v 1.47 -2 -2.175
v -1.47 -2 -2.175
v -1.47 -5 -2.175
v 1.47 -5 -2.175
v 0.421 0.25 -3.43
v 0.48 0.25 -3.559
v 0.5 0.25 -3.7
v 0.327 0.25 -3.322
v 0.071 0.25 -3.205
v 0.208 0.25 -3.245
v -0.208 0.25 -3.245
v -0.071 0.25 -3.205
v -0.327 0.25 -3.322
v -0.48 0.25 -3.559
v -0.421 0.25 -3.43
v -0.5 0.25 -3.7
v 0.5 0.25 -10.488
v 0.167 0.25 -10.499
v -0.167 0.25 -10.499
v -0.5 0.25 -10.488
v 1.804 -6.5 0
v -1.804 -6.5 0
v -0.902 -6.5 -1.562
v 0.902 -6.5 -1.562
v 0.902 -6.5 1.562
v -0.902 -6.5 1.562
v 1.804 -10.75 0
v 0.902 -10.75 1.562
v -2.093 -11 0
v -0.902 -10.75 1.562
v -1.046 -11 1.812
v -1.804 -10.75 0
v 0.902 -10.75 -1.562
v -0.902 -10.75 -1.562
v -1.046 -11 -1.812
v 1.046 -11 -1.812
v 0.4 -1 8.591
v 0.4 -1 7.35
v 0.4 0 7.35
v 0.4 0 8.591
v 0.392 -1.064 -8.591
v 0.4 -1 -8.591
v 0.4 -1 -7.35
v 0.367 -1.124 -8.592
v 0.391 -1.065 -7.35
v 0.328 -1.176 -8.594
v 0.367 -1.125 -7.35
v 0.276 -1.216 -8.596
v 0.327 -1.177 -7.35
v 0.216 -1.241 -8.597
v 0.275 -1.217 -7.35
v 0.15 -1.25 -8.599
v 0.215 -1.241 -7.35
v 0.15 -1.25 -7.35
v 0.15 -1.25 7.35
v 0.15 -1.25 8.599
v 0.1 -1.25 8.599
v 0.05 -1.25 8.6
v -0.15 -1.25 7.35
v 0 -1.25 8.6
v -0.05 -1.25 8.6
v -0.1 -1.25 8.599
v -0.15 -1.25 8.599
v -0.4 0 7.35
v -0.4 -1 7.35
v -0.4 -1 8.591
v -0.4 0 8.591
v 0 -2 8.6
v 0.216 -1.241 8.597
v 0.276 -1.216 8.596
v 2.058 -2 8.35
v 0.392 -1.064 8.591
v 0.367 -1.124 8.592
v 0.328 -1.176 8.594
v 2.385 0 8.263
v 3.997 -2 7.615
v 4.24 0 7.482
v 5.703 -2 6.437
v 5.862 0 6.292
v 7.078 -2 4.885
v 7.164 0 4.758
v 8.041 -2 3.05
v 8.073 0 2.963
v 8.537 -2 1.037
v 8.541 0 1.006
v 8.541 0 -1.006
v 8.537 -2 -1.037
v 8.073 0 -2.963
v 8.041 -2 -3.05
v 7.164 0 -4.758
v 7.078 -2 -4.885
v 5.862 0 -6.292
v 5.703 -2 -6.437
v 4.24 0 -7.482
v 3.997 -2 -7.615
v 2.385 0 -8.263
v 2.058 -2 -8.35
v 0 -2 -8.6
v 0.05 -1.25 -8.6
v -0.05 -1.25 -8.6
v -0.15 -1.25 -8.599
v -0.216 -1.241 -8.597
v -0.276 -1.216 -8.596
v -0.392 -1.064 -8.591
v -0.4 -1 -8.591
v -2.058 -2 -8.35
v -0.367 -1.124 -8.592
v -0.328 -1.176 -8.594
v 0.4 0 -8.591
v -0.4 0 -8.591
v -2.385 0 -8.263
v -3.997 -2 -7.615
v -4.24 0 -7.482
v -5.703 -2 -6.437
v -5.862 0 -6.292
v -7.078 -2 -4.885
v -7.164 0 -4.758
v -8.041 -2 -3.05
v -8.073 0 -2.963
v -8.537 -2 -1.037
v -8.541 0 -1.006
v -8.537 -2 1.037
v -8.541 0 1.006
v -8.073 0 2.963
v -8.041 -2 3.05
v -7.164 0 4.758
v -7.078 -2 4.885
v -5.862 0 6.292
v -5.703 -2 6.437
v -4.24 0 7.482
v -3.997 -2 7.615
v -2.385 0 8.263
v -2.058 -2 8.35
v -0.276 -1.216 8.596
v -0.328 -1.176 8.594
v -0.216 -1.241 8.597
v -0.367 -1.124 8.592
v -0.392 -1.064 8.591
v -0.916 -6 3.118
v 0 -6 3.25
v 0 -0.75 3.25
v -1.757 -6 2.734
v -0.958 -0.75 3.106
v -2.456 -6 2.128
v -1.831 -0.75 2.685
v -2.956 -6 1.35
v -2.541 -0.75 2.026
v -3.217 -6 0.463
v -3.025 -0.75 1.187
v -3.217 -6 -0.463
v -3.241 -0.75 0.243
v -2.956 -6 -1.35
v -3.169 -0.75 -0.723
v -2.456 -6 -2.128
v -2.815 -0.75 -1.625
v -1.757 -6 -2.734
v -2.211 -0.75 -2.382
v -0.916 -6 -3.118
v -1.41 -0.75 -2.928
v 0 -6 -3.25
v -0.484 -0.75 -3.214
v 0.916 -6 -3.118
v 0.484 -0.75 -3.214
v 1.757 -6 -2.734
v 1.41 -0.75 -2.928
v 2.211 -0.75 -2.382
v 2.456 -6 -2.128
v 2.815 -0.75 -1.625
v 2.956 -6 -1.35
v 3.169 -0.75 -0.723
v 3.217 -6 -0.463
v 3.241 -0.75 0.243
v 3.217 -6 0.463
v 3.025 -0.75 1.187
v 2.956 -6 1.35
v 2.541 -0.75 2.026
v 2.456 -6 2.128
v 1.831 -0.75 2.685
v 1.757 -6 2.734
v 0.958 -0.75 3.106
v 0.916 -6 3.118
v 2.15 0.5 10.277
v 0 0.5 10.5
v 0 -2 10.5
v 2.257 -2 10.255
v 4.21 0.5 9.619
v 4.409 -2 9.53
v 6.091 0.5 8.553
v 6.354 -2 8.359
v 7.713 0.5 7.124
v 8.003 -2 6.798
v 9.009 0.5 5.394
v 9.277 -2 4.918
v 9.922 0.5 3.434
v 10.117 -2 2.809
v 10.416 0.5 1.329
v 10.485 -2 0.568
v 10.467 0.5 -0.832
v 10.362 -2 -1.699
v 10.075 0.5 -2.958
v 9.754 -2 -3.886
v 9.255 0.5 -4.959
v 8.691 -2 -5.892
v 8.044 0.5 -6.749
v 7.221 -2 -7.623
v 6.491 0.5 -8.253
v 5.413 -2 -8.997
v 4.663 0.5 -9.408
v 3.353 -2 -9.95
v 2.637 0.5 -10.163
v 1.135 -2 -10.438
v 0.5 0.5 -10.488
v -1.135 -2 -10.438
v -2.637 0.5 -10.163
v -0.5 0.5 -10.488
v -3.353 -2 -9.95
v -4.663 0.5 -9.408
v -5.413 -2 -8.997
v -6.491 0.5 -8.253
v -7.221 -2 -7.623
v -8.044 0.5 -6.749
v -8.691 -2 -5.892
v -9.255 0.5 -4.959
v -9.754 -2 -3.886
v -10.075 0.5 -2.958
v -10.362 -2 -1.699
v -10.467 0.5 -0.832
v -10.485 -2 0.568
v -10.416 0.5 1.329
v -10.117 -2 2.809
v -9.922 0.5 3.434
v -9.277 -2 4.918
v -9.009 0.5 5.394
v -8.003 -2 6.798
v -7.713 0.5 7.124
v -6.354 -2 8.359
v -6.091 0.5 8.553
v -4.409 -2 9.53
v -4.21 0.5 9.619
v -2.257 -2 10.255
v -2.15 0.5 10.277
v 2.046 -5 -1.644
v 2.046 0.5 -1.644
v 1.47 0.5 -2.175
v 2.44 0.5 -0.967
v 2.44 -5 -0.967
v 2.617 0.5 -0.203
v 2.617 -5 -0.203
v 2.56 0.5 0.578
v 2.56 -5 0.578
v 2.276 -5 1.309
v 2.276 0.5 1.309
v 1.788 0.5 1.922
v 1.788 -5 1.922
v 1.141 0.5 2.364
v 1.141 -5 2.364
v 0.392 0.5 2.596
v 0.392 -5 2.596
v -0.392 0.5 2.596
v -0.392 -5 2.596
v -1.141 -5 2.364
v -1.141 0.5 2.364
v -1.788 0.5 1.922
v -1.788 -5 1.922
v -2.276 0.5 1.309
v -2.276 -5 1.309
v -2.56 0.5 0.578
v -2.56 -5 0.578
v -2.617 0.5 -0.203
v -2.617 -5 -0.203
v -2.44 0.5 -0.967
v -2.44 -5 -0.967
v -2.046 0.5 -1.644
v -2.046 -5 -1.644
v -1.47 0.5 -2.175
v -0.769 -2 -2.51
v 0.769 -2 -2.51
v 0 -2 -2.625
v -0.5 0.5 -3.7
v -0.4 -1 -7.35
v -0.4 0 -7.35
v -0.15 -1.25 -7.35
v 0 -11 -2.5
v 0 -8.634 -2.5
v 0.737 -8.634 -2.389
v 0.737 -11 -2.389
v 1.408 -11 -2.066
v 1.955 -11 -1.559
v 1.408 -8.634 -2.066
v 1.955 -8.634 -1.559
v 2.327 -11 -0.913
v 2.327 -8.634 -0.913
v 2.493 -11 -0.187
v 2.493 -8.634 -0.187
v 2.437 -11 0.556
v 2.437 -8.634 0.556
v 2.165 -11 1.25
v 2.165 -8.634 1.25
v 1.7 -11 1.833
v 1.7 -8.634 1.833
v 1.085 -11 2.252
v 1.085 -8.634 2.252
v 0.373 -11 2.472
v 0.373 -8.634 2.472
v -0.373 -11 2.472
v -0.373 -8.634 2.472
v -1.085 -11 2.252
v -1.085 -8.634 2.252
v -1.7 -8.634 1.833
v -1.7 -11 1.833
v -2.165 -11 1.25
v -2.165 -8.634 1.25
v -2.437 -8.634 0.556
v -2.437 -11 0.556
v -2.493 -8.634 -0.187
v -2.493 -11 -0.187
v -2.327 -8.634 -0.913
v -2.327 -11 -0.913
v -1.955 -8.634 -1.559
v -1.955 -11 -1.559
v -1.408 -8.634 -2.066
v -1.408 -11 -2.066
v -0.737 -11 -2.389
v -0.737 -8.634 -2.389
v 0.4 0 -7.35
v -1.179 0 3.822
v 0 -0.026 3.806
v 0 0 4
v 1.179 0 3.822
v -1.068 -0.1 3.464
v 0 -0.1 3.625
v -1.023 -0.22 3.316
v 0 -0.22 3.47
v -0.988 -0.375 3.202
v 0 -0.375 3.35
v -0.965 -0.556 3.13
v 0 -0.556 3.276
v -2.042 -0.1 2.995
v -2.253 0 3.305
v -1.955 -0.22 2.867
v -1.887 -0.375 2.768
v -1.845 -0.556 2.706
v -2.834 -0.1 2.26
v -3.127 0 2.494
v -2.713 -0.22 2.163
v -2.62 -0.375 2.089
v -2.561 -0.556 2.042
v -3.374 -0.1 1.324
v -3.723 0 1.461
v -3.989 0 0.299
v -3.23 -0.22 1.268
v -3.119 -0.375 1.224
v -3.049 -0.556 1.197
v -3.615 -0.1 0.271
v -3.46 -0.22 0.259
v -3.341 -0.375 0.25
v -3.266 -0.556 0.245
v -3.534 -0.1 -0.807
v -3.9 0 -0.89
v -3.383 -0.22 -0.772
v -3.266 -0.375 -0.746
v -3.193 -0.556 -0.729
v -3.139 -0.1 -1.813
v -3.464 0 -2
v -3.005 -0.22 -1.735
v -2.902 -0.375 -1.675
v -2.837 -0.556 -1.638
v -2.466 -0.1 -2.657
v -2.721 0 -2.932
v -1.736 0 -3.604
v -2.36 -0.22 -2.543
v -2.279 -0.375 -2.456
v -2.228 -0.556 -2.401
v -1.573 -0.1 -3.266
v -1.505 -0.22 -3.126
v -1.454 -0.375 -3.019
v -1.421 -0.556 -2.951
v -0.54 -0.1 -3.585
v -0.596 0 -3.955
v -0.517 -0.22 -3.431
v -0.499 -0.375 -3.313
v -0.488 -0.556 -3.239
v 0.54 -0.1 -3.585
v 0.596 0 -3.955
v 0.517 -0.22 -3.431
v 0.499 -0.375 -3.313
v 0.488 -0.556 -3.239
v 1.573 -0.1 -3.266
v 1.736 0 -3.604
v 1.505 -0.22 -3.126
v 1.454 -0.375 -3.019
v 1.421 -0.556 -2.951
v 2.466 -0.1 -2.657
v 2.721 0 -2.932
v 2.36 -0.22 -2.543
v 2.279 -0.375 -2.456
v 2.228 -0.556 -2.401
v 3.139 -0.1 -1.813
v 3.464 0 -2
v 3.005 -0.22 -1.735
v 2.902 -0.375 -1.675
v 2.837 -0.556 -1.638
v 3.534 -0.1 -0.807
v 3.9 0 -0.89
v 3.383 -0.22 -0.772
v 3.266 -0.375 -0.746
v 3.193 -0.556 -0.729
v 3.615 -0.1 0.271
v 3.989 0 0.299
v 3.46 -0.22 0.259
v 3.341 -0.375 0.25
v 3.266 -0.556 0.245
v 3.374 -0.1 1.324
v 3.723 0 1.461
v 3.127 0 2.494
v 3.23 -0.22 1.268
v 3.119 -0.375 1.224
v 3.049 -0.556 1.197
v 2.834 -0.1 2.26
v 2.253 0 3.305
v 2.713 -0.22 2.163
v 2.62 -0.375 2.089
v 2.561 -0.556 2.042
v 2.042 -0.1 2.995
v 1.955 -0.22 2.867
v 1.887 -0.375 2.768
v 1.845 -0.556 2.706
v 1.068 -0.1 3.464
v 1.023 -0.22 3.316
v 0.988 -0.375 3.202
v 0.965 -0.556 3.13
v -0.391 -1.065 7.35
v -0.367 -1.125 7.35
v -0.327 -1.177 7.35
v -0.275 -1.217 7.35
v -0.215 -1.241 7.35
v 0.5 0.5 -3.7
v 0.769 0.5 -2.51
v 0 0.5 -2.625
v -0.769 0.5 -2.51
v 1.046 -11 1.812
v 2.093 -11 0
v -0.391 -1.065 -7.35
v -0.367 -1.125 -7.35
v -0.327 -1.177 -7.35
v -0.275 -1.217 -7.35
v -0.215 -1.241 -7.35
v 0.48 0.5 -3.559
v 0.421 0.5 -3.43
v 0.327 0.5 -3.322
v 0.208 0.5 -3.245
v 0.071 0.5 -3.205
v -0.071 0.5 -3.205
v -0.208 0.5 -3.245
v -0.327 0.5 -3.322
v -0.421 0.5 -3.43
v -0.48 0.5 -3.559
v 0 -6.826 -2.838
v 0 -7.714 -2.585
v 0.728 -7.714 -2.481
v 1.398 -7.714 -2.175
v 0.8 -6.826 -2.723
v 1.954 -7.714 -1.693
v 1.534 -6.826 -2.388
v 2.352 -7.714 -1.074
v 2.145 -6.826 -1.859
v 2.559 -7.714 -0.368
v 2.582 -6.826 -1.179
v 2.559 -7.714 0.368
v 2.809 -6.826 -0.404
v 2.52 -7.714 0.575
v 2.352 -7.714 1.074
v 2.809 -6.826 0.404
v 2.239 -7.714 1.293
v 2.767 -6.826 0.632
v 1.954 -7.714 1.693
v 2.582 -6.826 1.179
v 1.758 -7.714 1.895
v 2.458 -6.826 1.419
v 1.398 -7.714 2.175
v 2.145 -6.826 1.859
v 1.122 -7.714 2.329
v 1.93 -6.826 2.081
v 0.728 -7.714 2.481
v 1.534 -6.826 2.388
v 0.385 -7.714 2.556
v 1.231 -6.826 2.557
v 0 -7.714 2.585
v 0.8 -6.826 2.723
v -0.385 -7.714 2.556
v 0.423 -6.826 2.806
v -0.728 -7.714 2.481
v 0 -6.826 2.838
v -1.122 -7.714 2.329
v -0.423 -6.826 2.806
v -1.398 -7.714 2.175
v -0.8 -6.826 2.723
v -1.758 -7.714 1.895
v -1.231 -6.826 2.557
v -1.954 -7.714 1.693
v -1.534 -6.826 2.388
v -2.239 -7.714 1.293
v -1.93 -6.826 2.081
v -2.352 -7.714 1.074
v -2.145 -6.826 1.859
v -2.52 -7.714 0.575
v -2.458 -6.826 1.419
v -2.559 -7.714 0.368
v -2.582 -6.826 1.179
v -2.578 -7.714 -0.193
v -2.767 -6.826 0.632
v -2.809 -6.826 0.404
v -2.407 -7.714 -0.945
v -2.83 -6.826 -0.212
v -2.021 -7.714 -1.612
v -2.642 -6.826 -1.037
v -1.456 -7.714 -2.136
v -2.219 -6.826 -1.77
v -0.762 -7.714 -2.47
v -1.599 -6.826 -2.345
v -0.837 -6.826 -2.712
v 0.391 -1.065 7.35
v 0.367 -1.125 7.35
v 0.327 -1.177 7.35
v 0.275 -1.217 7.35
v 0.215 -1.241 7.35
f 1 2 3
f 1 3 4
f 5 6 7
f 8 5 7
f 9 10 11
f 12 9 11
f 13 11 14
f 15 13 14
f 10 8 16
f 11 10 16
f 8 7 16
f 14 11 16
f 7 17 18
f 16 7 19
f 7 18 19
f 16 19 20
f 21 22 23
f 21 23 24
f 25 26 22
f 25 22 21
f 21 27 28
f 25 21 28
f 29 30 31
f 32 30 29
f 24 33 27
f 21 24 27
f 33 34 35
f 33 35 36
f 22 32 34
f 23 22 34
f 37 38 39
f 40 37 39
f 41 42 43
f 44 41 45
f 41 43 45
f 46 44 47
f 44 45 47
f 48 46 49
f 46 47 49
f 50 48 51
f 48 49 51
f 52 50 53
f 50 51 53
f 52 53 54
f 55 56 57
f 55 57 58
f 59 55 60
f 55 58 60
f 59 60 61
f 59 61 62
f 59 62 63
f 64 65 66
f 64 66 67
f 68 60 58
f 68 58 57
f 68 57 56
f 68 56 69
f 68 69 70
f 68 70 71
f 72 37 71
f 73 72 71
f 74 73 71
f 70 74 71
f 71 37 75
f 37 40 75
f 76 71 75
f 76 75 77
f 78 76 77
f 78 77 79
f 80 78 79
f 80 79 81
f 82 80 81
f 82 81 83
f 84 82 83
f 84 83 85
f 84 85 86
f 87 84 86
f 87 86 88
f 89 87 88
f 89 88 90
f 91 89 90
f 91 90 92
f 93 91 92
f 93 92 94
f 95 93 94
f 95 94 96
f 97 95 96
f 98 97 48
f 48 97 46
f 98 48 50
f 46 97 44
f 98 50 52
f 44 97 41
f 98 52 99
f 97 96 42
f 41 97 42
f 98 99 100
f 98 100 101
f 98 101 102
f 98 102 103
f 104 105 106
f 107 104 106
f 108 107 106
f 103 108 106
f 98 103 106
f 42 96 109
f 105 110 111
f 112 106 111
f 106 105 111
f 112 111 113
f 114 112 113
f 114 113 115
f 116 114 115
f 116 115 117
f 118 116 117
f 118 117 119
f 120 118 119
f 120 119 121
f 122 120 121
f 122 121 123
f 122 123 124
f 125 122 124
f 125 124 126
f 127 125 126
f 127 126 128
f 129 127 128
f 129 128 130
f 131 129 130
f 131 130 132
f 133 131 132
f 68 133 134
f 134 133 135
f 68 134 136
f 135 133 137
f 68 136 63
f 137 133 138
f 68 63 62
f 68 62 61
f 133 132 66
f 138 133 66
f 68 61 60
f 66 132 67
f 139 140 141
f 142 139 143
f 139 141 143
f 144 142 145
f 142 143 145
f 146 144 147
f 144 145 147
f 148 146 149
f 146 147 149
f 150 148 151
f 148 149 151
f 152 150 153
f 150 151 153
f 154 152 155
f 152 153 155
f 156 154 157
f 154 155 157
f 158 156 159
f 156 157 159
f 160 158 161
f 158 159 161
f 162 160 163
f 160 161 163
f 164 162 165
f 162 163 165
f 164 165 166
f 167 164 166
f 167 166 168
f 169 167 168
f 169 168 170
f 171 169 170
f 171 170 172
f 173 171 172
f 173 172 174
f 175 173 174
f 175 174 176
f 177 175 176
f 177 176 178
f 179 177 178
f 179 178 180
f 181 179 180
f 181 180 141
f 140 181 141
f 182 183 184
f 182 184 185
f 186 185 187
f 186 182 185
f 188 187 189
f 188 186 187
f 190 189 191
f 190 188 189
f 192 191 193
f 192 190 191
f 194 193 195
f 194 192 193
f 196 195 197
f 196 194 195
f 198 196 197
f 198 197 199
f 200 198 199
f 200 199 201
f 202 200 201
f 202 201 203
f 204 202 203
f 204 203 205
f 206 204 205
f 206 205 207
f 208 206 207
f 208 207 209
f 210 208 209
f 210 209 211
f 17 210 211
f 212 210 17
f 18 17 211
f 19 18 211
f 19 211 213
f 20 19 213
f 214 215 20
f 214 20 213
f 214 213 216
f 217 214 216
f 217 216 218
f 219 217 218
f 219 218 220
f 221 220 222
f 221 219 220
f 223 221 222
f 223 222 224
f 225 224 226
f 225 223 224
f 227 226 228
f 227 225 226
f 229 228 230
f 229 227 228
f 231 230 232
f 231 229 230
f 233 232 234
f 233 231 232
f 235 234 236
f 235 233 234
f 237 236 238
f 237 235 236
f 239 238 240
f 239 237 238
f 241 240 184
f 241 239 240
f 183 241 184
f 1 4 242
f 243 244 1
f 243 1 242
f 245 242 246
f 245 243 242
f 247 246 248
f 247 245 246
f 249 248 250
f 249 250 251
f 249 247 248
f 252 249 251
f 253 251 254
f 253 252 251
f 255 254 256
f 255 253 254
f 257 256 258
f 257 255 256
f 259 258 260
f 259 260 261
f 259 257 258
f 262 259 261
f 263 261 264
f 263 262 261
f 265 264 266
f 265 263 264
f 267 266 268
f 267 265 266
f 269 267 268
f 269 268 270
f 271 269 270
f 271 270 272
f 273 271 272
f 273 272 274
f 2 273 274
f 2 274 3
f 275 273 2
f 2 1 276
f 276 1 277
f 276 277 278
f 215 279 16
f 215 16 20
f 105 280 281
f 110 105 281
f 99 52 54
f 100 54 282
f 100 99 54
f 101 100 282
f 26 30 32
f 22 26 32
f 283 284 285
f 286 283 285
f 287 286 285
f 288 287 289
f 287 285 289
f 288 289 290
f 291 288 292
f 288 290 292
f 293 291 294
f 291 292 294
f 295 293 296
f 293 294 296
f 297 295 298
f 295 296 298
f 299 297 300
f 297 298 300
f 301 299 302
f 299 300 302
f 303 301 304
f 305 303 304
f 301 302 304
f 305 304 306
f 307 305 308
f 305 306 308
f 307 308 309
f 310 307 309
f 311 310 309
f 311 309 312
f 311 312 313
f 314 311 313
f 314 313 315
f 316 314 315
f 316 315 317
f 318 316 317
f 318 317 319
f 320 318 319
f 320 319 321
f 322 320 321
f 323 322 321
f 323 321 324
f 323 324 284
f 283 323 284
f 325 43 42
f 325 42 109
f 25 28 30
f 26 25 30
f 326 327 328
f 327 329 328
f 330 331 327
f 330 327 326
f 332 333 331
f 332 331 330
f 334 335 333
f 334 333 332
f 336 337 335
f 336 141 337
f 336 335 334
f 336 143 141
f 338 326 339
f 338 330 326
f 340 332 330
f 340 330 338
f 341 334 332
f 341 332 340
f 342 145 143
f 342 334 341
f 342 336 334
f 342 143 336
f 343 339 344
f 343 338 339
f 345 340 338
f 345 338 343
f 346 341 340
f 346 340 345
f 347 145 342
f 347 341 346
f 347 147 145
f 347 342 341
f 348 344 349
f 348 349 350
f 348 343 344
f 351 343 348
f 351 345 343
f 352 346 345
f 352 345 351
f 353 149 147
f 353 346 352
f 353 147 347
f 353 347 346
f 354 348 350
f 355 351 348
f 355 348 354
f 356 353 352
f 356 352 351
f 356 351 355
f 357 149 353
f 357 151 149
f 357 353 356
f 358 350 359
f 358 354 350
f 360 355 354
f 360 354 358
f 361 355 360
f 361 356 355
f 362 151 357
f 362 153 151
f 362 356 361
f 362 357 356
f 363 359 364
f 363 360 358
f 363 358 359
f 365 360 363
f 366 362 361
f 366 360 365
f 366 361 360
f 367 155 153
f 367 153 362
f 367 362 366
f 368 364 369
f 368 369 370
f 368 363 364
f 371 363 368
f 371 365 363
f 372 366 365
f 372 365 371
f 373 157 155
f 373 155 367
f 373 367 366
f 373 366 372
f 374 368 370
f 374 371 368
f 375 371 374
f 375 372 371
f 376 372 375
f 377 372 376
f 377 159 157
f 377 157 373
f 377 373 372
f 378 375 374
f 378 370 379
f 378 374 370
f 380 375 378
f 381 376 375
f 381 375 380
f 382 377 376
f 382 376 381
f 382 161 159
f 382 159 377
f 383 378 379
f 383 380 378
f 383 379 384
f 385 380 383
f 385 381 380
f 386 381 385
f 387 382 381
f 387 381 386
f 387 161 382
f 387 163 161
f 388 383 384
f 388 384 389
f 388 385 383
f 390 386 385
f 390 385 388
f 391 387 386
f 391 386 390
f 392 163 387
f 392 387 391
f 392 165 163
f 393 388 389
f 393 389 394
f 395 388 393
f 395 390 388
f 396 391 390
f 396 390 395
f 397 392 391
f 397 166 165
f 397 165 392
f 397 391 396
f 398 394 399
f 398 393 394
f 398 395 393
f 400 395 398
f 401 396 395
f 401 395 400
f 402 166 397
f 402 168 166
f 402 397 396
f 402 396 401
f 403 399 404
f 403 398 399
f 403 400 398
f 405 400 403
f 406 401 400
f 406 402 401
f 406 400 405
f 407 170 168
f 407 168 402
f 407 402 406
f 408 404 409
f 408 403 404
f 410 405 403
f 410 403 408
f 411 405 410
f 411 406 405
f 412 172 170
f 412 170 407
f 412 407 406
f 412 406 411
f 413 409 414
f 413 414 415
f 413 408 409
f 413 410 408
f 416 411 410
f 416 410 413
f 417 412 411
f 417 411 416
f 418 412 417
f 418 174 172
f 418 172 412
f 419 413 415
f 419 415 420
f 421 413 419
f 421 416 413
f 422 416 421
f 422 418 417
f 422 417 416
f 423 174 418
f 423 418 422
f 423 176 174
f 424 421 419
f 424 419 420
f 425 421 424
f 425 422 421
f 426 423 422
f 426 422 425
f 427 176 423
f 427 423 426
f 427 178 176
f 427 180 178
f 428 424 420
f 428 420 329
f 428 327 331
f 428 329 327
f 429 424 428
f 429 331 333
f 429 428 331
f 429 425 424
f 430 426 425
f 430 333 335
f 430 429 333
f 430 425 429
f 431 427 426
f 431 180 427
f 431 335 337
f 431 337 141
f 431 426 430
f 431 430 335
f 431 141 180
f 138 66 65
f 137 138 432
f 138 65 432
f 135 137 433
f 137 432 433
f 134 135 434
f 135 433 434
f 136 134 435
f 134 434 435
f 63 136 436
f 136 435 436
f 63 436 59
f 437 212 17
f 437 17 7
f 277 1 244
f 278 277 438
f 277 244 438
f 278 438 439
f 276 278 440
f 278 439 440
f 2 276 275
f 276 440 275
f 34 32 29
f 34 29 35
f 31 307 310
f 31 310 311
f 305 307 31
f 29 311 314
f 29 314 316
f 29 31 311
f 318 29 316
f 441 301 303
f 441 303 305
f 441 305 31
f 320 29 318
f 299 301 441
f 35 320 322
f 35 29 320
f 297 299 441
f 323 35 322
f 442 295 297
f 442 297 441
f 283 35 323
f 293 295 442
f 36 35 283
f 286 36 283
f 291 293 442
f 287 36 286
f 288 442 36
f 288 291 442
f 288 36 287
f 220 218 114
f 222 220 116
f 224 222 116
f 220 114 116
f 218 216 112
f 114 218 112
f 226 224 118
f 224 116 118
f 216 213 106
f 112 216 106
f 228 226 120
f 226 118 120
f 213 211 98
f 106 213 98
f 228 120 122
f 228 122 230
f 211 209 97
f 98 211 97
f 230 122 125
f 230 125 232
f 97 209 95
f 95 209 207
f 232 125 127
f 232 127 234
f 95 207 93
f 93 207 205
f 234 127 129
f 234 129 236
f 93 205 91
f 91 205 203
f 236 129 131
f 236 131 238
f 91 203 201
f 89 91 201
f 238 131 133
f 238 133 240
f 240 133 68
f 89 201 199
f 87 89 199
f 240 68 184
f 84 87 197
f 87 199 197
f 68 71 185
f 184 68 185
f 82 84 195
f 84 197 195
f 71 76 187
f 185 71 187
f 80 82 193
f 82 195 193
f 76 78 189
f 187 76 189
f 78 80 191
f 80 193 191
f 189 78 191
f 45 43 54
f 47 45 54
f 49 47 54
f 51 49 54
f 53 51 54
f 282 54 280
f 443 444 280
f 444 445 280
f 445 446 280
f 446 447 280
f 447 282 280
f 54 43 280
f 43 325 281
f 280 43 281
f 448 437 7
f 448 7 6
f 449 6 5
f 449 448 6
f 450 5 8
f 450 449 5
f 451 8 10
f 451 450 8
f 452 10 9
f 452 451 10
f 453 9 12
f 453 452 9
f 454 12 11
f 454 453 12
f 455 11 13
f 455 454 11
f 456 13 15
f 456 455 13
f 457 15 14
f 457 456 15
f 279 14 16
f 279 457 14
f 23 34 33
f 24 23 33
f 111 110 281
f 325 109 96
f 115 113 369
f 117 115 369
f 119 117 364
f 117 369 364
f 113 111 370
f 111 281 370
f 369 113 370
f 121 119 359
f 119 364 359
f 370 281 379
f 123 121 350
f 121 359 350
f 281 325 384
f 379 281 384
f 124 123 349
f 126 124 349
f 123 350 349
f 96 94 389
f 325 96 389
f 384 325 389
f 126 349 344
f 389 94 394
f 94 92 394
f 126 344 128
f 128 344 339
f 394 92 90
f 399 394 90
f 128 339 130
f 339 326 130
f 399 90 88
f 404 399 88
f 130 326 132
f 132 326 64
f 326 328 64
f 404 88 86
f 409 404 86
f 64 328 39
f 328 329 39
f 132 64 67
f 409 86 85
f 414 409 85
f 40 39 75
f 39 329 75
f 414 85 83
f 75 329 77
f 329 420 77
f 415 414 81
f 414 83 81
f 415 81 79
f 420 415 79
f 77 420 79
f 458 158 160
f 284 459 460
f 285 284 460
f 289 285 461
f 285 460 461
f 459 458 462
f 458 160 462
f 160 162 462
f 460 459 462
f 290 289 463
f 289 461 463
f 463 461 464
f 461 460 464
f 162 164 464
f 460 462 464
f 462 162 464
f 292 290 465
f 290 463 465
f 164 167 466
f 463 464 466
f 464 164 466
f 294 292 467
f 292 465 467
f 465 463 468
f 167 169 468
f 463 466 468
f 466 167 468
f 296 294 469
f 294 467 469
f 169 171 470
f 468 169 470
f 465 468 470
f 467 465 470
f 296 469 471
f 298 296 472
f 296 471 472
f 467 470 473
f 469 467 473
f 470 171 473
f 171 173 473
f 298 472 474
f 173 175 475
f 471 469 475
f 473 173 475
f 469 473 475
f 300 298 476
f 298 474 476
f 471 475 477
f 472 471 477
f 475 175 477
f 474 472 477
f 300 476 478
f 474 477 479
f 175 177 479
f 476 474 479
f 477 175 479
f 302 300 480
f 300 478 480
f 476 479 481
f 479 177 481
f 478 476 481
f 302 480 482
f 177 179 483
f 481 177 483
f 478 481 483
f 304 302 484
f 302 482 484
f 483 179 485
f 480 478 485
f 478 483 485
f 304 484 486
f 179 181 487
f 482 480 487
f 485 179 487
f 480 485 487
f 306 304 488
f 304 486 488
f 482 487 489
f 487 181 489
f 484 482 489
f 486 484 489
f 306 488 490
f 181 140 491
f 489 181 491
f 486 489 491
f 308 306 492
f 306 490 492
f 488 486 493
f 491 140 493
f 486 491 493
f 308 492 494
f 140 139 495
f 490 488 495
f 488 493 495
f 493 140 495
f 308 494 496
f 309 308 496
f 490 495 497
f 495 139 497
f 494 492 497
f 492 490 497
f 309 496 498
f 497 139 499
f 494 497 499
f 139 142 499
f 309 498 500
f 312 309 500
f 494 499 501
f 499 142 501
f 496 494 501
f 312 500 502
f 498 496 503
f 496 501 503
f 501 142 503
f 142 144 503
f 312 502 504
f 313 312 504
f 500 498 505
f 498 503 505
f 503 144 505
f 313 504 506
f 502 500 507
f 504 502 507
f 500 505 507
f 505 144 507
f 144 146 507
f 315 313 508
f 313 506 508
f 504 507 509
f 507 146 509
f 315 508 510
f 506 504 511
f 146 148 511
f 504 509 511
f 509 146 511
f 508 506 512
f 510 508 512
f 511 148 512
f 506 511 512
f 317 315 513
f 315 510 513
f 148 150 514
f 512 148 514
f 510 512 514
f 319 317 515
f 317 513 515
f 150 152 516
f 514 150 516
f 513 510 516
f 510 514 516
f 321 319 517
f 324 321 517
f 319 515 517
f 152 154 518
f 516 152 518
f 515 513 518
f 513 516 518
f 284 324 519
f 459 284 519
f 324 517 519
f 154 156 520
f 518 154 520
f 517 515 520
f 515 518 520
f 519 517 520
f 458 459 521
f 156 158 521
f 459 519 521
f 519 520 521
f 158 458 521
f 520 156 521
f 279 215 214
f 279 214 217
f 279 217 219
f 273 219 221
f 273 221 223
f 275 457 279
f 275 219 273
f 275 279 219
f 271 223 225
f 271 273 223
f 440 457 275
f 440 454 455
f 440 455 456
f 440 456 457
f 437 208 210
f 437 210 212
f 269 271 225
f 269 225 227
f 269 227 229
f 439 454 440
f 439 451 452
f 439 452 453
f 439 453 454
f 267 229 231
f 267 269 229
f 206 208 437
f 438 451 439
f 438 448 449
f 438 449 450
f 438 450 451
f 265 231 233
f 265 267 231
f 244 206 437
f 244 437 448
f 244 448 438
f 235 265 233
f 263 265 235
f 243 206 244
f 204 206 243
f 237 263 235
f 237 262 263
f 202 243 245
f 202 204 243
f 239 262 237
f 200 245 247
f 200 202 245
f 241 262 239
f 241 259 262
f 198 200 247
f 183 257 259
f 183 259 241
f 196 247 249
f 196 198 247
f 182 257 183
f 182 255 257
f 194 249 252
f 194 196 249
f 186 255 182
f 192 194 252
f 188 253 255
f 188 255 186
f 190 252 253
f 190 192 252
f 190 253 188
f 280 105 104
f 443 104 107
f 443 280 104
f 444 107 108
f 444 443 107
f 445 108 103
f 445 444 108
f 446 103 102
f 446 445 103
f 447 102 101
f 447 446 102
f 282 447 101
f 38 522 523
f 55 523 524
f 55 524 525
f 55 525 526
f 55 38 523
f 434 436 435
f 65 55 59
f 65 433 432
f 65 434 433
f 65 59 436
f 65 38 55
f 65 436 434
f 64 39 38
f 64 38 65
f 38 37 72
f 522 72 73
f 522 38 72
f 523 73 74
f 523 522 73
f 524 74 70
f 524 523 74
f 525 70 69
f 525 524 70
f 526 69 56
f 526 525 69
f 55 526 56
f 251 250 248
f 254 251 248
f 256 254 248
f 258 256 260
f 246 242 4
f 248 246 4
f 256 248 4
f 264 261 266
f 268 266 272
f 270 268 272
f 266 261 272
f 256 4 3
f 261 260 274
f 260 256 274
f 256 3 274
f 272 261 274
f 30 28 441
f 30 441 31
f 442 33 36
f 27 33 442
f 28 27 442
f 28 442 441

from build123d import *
from build123d.topology import SkipClean

# Parameters (mm, degrees)
SKETCH1_R           = 10.5
SKETCH1_R_2         = 8.6
BOSS_EXTRUDE1_DEPTH = 2
SKETCH2_W           = 0.8
SKETCH2_H           = 1.25
BOSS_EXTRUDE2_DEPTH = 1.25
BOSS_EXTRUDE3_START = 17.2
SKETCH2_2_W         = 0.8
SKETCH2_2_H         = 1.25
BOSS_EXTRUDE3_DEPTH = 1.25
BOSS_EXTRUDE4_START = 0.5
SKETCH3_R           = 10.5
BOSS_EXTRUDE4_DEPTH = 0.5
SKETCH5_R           = 3.25
BOSS_EXTRUDE5_DEPTH = 6
FILLET2_R           = 0.75
CUT_EXTRUDE1_DEPTH  = 5.5
FILLET1_R           = 0.25
SKETCH7_R           = 2.625
CUT_EXTRUDE2_DEPTH  = 2.5
CUT_EXTRUDE3_DEPTH  = 0.25
SKETCH11_R          = 2.5
BOSS_EXTRUDE6_DEPTH = 5
CUT_EXTRUDE4_START  = 5
CUT_EXTRUDE4_DEPTH  = 4.5
CHAMFER2_SIZE       = 0.25
FILLET3_R           = 5


with BuildPart() as part:
    # Sketch1 → Boss-Extrude1 (new body)
    with BuildSketch(Plane(origin=(0, 0, 0), x_dir=(1, 0, 0), z_dir=(0, 1, 0))):
        with Locations(Location((0, 0, 0), (0, 0, 270))):
            Circle(SKETCH1_R)
        with Locations(Location((0, 0, 0), (0, 0, 270))):
            Circle(SKETCH1_R_2, mode=Mode.SUBTRACT)
    extrude(amount=-BOSS_EXTRUDE1_DEPTH)

    # Sketch2 → Boss-Extrude2 (add)
    with BuildSketch(Plane(origin=(0, 0, 8.6), x_dir=(-1, 0, 0), z_dir=(0, 0, -1))):
        with Locations((0, -0.625)):
            Rectangle(SKETCH2_W, SKETCH2_H)
    extrude(amount=BOSS_EXTRUDE2_DEPTH)

    # Sketch2<2> → Boss-Extrude3 (add)
    with BuildSketch(Plane(origin=(0, 0, 8.6), x_dir=(-1, 0, 0), z_dir=(0, 0, -1)).offset(BOSS_EXTRUDE3_START)):
        with Locations((0, -0.625)):
            Rectangle(SKETCH2_2_W, SKETCH2_2_H)
    extrude(amount=-BOSS_EXTRUDE3_DEPTH)

    # Sketch3 → Boss-Extrude4 (add)
    with BuildSketch(Plane(origin=(0, 0, 0), x_dir=(1, 0, 0), z_dir=(0, 1, 0)).offset(BOSS_EXTRUDE4_START)):
        with Locations(Location((0, 0, 0), (0, 0, 270))):
            Circle(SKETCH3_R)
    extrude(amount=-BOSS_EXTRUDE4_DEPTH)

    # Sketch5 → Boss-Extrude5 (add)
    with BuildSketch(Plane.XZ):
        with Locations(Location((0, 0, 0), (0, 0, 90))):
            Circle(SKETCH5_R)
    extrude(amount=BOSS_EXTRUDE5_DEPTH)

    # Fillet2
    fillet2_edges = [part.edges().sort_by_distance(p)[0] for p in [
        (0, 0, -3.25),
    ]]
    fillet(fillet2_edges, radius=FILLET2_R)

    # Sketch4 → Cut-Extrude1 (cut)
    with BuildSketch(Plane(origin=(0, 0.5, 0), x_dir=(1, 0, 0), z_dir=(0, 1, 0))):
        with BuildLine():
            Line((-1.469693846, 2.175), (1.469693846, 2.175))
            ThreePointArc((1.469693846, 2.175), (0, -2.625), (-1.469693846, 2.175))
        make_face()
    extrude(amount=-CUT_EXTRUDE1_DEPTH, mode=Mode.SUBTRACT)

    # Fillet1
    fillet1_edges = [part.edges().sort_by_distance(p)[0] for p in [
        (-0.4, -1.25, 7.970346319),
        (0.4, -1.25, 7.970346319),
        (-0.4, -1.25, -7.970346319),
        (0.4, -1.25, -7.970346319),
    ]]
    fillet(fillet1_edges, radius=FILLET1_R)

    # Sketch7 → Cut-Extrude2 (cut)
    with SkipClean():  # the faces are left unmerged after this step: merging them gives an invalid solid
        with BuildSketch(Plane(origin=(0, 0.5, 0), x_dir=(1, 0, 0), z_dir=(0, 1, 0))):
            with Locations(Location((0, 0, 0), (0, 0, 270))):
                Circle(SKETCH7_R)
        extrude(amount=-CUT_EXTRUDE2_DEPTH, mode=Mode.SUBTRACT)

    # Sketch9 → Cut-Extrude3 (cut)
    with SkipClean():  # the faces are left unmerged after this step: merging them gives an invalid solid
        with BuildSketch(Plane(origin=(0, 0.5, 0), x_dir=(1, 0, 0), z_dir=(0, 1, 0))):
            with BuildLine():
                Line((-0.5, 3.7), (-0.5, 13.7))
                ThreePointArc((-0.5, 13.7), (0, 14.2), (0.5, 13.7))
                Line((0.5, 13.7), (0.5, 3.7))
                ThreePointArc((0.5, 3.7), (0, 3.2), (-0.5, 3.7))
            make_face()
        extrude(amount=-CUT_EXTRUDE3_DEPTH, mode=Mode.SUBTRACT)

    # Sketch11 → Boss-Extrude6 (add)
    with SkipClean():  # the faces are left unmerged after this step: merging them gives an invalid solid
        with BuildSketch(Plane.XZ.offset(6)):
            with Locations(Location((0, 0, 0), (0, 0, 270))):
                Circle(SKETCH11_R)
        extrude(amount=BOSS_EXTRUDE6_DEPTH)

    # Sketch10 → Cut-Extrude4 (cut)
    with SkipClean():  # the faces are left unmerged after this step: merging them gives an invalid solid
        with BuildSketch(Plane.XZ.offset(6).offset(CUT_EXTRUDE4_START)):
            Polygon((1.804219591, 0), (0.902109796, 1.5625), (-0.902109796, 1.5625), (-1.804219591, 0), (-0.902109796, -1.5625), (0.902109796, -1.5625), align=None)
        extrude(amount=-CUT_EXTRUDE4_DEPTH, mode=Mode.SUBTRACT)

    # Chamfer2
    chamfer2_edges = [part.edges().sort_by_distance(p)[0] for p in [
        (-1.353164693, -11, -0.78125),
        (-1.353164693, -11, 0.78125),
        (0, -11, 1.5625),
        (1.353164693, -11, 0.78125),
        (1.353164693, -11, -0.78125),
        (0, -11, -1.5625),
    ]]
    chamfer(chamfer2_edges, length=CHAMFER2_SIZE)

    # Fillet3
    # the kernel refuses this fillet: 5 mm, written as the material it adds along each edge
    with BuildSketch(Plane(origin=(0, -6, 0), x_dir=(0, 0, -1), z_dir=(-1, 0, 0))) as fillet3_piece_1:
        with BuildLine():
            CenterArc((7.5, 2.633913438), FILLET3_R, 180, 31.788330617)
            Line((3.25, 0), (3.165, -0.052678269))
            ThreePointArc((3.165, -0.052678269), (2.875, -0.1), (2.5, -0.1))
            Line((2.5, -0.1), (2.4, 0))
            Line((2.4, 0), (2.4, 2.633913438))
            Line((2.4, 2.633913438), (2.5, 2.633913438))
        make_face()
    revolve(axis=Axis((0, -6, 0), (0, -1, 0)))


solid = part.part
